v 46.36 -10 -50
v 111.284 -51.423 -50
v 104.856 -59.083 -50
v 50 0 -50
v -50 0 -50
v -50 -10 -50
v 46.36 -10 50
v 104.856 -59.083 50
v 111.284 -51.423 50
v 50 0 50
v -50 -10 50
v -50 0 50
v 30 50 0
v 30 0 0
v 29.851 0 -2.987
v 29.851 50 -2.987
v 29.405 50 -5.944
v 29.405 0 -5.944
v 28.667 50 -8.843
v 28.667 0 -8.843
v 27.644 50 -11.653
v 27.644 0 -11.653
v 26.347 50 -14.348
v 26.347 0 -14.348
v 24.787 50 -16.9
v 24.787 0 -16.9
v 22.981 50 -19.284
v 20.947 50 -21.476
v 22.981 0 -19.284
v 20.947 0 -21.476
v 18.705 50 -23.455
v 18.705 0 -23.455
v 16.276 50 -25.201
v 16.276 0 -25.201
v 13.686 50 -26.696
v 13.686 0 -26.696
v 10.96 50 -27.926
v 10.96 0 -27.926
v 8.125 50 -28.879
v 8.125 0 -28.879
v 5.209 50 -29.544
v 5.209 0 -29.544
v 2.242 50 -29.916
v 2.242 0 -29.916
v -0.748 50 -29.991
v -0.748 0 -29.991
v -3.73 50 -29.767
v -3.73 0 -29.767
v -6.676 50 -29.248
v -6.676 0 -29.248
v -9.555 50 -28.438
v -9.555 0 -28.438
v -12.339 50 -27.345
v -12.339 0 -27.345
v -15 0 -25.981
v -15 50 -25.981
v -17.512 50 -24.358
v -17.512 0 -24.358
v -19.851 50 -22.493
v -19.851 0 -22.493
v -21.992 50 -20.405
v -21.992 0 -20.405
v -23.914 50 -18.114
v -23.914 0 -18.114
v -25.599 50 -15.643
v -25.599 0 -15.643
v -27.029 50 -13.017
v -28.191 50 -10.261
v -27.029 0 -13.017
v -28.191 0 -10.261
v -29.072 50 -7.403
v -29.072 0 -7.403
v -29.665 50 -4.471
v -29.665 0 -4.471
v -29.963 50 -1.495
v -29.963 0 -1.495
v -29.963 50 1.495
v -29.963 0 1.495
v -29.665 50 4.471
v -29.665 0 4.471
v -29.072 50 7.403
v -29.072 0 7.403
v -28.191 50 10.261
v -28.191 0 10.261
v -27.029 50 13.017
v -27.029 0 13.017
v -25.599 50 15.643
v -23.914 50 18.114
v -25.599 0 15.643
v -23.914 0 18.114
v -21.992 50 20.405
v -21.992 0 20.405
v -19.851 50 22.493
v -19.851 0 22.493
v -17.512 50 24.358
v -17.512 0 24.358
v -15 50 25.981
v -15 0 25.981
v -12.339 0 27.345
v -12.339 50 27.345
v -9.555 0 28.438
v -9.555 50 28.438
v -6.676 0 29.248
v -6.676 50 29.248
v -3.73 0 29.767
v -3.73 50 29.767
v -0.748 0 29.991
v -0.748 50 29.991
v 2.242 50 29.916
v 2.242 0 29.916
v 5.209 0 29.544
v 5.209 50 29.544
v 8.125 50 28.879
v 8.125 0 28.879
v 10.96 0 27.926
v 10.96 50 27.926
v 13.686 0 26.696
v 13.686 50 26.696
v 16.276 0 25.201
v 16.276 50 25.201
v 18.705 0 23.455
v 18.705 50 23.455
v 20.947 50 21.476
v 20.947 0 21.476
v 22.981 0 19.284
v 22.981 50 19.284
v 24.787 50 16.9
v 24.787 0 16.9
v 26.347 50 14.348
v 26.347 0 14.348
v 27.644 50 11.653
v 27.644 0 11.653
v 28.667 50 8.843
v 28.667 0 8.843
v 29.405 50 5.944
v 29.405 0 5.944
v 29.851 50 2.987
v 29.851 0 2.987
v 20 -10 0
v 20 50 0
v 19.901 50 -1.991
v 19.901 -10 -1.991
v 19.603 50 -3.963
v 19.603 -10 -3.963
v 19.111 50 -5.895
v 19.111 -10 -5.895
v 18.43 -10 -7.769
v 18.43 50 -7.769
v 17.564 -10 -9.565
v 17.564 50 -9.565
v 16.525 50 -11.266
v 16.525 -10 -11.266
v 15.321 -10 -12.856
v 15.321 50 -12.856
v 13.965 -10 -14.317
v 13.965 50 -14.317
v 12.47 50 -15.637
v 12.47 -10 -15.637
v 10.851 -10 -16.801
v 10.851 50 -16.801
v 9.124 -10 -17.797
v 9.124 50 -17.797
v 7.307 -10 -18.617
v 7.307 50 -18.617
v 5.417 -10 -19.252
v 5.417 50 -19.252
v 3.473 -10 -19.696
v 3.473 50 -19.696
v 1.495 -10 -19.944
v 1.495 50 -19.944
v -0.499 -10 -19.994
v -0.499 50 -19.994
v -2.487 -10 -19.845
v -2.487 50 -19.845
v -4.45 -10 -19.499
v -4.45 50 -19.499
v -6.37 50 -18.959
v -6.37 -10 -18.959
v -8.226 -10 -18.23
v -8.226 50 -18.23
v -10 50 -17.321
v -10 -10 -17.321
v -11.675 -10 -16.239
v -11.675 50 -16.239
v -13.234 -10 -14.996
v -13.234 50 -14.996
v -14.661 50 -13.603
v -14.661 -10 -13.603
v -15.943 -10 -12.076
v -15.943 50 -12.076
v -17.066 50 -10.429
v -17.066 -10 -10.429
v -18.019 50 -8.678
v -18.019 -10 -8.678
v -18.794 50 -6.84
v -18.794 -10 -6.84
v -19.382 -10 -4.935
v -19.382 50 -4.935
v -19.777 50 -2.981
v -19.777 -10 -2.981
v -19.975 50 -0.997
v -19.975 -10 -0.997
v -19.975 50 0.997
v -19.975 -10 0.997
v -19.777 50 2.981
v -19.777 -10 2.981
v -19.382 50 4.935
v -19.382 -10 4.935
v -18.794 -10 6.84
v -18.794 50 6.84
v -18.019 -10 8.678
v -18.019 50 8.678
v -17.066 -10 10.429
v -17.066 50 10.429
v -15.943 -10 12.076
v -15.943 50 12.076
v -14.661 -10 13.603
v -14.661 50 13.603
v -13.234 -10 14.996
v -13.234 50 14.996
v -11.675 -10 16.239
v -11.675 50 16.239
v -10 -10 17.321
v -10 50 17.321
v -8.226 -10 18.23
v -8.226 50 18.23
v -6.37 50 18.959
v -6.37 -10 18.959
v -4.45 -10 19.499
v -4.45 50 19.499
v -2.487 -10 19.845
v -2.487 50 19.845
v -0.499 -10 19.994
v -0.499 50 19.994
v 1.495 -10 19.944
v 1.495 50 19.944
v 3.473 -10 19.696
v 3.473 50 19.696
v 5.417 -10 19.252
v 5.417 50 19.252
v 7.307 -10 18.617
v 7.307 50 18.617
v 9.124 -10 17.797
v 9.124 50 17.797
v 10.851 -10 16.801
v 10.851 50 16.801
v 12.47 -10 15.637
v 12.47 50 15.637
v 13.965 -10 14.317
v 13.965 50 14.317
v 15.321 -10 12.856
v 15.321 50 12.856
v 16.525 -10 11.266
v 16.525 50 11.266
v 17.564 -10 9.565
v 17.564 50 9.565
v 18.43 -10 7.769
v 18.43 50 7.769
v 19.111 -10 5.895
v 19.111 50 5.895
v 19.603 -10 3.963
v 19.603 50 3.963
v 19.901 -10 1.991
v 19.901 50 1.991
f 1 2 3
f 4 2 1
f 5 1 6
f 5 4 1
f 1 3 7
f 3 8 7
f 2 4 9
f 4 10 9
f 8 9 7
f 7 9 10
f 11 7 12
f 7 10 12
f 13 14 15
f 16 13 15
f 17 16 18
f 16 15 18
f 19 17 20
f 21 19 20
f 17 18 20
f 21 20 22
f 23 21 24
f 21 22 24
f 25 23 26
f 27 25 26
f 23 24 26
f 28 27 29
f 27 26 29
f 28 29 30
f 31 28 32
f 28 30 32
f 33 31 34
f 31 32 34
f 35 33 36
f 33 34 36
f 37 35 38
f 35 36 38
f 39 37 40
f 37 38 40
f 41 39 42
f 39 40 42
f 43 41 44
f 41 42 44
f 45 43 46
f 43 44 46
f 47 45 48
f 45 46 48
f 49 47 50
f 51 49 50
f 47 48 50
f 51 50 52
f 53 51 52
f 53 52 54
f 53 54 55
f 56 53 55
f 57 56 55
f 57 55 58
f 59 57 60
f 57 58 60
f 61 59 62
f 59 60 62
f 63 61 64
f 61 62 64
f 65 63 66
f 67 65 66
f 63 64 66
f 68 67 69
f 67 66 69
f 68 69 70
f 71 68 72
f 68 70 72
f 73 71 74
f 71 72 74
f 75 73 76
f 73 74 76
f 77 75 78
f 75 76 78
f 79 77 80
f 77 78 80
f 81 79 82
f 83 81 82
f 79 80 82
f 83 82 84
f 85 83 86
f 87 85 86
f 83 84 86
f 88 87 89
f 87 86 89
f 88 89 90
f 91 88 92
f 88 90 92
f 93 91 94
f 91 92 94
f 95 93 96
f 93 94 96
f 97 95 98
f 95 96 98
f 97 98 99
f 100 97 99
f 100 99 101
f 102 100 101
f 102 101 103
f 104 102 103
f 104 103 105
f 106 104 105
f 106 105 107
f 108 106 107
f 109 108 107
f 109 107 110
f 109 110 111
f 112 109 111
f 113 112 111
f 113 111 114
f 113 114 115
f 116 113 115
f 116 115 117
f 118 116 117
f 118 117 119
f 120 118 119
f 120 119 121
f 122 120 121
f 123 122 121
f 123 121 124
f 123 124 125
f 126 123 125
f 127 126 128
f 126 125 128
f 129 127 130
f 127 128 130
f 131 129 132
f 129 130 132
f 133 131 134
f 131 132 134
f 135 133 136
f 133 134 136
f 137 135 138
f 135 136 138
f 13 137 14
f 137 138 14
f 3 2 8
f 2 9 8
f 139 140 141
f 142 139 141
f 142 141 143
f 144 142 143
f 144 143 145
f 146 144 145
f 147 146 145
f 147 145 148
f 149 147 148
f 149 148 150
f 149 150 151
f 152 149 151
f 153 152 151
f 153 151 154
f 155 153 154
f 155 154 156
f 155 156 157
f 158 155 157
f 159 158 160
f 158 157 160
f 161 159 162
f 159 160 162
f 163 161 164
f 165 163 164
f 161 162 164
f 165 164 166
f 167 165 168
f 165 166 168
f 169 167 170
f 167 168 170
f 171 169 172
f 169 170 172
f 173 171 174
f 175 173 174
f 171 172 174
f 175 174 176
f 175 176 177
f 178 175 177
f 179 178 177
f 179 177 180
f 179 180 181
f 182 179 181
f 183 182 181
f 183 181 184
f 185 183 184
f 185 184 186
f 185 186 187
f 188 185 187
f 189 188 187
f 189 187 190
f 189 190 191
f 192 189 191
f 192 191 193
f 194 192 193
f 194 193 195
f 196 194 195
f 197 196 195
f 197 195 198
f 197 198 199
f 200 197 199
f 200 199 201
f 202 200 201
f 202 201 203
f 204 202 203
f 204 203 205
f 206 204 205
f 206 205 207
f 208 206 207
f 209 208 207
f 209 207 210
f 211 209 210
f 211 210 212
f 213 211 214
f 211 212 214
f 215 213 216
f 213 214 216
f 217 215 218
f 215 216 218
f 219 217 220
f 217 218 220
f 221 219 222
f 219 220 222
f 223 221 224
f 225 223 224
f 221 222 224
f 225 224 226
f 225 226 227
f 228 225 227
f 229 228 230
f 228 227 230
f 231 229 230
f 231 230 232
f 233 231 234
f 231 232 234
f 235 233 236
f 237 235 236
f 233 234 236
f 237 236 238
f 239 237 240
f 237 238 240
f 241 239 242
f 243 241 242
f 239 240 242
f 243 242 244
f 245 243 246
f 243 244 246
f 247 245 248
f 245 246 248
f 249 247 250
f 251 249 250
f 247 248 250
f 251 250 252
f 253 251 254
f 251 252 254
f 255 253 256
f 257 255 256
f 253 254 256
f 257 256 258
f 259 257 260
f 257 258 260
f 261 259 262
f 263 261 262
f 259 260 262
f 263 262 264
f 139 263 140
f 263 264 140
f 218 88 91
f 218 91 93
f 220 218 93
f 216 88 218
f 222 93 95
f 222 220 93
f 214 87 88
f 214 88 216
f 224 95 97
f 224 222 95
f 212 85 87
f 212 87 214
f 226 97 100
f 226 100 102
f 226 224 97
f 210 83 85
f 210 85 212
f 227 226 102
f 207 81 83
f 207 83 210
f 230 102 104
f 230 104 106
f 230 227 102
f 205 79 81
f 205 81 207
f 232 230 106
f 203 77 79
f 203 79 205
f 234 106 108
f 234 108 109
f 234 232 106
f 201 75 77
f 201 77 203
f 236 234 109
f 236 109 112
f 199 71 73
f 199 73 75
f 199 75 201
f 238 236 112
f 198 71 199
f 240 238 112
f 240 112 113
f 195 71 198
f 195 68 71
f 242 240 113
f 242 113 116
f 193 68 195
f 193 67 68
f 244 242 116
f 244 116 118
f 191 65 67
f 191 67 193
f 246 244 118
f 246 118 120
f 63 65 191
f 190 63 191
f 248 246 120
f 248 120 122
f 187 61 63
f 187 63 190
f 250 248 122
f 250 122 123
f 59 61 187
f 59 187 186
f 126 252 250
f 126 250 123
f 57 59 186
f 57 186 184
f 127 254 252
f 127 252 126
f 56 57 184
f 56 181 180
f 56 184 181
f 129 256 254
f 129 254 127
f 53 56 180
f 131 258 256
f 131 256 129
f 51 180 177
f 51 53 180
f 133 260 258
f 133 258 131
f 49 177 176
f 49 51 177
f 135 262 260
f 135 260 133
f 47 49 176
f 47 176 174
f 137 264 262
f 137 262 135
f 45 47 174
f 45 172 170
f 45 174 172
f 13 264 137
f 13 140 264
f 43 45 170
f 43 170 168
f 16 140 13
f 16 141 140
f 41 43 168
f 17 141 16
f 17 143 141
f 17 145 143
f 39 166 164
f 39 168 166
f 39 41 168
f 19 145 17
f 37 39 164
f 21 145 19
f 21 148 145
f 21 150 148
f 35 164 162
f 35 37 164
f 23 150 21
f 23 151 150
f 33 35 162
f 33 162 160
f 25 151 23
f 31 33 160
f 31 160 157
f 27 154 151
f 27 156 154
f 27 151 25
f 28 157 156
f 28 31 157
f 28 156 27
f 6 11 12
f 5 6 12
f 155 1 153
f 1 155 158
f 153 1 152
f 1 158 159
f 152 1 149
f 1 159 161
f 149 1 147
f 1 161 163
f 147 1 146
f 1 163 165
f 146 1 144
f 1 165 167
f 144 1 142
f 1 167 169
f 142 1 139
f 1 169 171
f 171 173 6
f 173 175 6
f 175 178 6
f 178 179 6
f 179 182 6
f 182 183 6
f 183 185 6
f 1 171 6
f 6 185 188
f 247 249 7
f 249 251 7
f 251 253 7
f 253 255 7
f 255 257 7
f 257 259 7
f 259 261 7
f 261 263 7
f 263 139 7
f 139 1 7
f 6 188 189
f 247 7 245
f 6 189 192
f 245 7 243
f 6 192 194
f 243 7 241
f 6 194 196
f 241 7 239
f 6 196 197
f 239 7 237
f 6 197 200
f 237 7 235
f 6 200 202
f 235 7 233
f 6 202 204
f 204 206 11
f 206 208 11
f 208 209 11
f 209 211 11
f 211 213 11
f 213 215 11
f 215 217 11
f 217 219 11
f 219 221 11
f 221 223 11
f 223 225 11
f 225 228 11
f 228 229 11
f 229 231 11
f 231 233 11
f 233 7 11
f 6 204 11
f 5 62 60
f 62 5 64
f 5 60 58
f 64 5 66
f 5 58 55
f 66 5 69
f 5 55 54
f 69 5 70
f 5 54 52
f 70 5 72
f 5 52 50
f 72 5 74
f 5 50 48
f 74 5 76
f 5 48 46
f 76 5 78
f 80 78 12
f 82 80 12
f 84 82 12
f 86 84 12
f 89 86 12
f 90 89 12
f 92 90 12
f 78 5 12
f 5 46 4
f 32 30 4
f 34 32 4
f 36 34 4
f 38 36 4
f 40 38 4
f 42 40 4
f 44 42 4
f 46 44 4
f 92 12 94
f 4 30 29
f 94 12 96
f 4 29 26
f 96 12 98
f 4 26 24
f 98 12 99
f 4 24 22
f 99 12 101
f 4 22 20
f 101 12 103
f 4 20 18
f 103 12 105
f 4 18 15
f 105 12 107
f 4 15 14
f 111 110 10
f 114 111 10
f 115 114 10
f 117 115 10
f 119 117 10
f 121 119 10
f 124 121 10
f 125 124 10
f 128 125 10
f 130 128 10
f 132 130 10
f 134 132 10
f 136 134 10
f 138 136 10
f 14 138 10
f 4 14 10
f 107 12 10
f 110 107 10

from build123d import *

# Parameters (mm, degrees)
EXTRUDE_THIN1_DEPTH = 50
SKETCH3_R           = 30
BOSS_EXTRUDE1_DEPTH = 50
SKETCH4_R           = 20
CUT_EXTRUDE1_DEPTH  = 110.083453206


with BuildPart() as part:
    # Sketch1 → Extrude-Thin1 (new body, symmetric)
    with BuildSketch(Plane.XY):
        Polygon((-50, 0), (50, 0), (111.28355545, -51.423008775), (104.855679353, -59.083453206), (46.360297657, -10), (-50, -10), align=None)
    extrude(amount=EXTRUDE_THIN1_DEPTH, both=True)

    # Sketch3 → Boss-Extrude1 (add)
    with BuildSketch(Plane(origin=(0, 0, 0), x_dir=(1, 0, 0), z_dir=(0, 1, 0))):
        Circle(SKETCH3_R)
    extrude(amount=BOSS_EXTRUDE1_DEPTH)

    # Sketch4 → Cut-Extrude1 (cut, through all)
    with BuildSketch(Plane(origin=(0, 50, 0), x_dir=(1, 0, 0), z_dir=(0, 1, 0))):
        Circle(SKETCH4_R)
    extrude(amount=-CUT_EXTRUDE1_DEPTH, mode=Mode.SUBTRACT)


solid = part.part
